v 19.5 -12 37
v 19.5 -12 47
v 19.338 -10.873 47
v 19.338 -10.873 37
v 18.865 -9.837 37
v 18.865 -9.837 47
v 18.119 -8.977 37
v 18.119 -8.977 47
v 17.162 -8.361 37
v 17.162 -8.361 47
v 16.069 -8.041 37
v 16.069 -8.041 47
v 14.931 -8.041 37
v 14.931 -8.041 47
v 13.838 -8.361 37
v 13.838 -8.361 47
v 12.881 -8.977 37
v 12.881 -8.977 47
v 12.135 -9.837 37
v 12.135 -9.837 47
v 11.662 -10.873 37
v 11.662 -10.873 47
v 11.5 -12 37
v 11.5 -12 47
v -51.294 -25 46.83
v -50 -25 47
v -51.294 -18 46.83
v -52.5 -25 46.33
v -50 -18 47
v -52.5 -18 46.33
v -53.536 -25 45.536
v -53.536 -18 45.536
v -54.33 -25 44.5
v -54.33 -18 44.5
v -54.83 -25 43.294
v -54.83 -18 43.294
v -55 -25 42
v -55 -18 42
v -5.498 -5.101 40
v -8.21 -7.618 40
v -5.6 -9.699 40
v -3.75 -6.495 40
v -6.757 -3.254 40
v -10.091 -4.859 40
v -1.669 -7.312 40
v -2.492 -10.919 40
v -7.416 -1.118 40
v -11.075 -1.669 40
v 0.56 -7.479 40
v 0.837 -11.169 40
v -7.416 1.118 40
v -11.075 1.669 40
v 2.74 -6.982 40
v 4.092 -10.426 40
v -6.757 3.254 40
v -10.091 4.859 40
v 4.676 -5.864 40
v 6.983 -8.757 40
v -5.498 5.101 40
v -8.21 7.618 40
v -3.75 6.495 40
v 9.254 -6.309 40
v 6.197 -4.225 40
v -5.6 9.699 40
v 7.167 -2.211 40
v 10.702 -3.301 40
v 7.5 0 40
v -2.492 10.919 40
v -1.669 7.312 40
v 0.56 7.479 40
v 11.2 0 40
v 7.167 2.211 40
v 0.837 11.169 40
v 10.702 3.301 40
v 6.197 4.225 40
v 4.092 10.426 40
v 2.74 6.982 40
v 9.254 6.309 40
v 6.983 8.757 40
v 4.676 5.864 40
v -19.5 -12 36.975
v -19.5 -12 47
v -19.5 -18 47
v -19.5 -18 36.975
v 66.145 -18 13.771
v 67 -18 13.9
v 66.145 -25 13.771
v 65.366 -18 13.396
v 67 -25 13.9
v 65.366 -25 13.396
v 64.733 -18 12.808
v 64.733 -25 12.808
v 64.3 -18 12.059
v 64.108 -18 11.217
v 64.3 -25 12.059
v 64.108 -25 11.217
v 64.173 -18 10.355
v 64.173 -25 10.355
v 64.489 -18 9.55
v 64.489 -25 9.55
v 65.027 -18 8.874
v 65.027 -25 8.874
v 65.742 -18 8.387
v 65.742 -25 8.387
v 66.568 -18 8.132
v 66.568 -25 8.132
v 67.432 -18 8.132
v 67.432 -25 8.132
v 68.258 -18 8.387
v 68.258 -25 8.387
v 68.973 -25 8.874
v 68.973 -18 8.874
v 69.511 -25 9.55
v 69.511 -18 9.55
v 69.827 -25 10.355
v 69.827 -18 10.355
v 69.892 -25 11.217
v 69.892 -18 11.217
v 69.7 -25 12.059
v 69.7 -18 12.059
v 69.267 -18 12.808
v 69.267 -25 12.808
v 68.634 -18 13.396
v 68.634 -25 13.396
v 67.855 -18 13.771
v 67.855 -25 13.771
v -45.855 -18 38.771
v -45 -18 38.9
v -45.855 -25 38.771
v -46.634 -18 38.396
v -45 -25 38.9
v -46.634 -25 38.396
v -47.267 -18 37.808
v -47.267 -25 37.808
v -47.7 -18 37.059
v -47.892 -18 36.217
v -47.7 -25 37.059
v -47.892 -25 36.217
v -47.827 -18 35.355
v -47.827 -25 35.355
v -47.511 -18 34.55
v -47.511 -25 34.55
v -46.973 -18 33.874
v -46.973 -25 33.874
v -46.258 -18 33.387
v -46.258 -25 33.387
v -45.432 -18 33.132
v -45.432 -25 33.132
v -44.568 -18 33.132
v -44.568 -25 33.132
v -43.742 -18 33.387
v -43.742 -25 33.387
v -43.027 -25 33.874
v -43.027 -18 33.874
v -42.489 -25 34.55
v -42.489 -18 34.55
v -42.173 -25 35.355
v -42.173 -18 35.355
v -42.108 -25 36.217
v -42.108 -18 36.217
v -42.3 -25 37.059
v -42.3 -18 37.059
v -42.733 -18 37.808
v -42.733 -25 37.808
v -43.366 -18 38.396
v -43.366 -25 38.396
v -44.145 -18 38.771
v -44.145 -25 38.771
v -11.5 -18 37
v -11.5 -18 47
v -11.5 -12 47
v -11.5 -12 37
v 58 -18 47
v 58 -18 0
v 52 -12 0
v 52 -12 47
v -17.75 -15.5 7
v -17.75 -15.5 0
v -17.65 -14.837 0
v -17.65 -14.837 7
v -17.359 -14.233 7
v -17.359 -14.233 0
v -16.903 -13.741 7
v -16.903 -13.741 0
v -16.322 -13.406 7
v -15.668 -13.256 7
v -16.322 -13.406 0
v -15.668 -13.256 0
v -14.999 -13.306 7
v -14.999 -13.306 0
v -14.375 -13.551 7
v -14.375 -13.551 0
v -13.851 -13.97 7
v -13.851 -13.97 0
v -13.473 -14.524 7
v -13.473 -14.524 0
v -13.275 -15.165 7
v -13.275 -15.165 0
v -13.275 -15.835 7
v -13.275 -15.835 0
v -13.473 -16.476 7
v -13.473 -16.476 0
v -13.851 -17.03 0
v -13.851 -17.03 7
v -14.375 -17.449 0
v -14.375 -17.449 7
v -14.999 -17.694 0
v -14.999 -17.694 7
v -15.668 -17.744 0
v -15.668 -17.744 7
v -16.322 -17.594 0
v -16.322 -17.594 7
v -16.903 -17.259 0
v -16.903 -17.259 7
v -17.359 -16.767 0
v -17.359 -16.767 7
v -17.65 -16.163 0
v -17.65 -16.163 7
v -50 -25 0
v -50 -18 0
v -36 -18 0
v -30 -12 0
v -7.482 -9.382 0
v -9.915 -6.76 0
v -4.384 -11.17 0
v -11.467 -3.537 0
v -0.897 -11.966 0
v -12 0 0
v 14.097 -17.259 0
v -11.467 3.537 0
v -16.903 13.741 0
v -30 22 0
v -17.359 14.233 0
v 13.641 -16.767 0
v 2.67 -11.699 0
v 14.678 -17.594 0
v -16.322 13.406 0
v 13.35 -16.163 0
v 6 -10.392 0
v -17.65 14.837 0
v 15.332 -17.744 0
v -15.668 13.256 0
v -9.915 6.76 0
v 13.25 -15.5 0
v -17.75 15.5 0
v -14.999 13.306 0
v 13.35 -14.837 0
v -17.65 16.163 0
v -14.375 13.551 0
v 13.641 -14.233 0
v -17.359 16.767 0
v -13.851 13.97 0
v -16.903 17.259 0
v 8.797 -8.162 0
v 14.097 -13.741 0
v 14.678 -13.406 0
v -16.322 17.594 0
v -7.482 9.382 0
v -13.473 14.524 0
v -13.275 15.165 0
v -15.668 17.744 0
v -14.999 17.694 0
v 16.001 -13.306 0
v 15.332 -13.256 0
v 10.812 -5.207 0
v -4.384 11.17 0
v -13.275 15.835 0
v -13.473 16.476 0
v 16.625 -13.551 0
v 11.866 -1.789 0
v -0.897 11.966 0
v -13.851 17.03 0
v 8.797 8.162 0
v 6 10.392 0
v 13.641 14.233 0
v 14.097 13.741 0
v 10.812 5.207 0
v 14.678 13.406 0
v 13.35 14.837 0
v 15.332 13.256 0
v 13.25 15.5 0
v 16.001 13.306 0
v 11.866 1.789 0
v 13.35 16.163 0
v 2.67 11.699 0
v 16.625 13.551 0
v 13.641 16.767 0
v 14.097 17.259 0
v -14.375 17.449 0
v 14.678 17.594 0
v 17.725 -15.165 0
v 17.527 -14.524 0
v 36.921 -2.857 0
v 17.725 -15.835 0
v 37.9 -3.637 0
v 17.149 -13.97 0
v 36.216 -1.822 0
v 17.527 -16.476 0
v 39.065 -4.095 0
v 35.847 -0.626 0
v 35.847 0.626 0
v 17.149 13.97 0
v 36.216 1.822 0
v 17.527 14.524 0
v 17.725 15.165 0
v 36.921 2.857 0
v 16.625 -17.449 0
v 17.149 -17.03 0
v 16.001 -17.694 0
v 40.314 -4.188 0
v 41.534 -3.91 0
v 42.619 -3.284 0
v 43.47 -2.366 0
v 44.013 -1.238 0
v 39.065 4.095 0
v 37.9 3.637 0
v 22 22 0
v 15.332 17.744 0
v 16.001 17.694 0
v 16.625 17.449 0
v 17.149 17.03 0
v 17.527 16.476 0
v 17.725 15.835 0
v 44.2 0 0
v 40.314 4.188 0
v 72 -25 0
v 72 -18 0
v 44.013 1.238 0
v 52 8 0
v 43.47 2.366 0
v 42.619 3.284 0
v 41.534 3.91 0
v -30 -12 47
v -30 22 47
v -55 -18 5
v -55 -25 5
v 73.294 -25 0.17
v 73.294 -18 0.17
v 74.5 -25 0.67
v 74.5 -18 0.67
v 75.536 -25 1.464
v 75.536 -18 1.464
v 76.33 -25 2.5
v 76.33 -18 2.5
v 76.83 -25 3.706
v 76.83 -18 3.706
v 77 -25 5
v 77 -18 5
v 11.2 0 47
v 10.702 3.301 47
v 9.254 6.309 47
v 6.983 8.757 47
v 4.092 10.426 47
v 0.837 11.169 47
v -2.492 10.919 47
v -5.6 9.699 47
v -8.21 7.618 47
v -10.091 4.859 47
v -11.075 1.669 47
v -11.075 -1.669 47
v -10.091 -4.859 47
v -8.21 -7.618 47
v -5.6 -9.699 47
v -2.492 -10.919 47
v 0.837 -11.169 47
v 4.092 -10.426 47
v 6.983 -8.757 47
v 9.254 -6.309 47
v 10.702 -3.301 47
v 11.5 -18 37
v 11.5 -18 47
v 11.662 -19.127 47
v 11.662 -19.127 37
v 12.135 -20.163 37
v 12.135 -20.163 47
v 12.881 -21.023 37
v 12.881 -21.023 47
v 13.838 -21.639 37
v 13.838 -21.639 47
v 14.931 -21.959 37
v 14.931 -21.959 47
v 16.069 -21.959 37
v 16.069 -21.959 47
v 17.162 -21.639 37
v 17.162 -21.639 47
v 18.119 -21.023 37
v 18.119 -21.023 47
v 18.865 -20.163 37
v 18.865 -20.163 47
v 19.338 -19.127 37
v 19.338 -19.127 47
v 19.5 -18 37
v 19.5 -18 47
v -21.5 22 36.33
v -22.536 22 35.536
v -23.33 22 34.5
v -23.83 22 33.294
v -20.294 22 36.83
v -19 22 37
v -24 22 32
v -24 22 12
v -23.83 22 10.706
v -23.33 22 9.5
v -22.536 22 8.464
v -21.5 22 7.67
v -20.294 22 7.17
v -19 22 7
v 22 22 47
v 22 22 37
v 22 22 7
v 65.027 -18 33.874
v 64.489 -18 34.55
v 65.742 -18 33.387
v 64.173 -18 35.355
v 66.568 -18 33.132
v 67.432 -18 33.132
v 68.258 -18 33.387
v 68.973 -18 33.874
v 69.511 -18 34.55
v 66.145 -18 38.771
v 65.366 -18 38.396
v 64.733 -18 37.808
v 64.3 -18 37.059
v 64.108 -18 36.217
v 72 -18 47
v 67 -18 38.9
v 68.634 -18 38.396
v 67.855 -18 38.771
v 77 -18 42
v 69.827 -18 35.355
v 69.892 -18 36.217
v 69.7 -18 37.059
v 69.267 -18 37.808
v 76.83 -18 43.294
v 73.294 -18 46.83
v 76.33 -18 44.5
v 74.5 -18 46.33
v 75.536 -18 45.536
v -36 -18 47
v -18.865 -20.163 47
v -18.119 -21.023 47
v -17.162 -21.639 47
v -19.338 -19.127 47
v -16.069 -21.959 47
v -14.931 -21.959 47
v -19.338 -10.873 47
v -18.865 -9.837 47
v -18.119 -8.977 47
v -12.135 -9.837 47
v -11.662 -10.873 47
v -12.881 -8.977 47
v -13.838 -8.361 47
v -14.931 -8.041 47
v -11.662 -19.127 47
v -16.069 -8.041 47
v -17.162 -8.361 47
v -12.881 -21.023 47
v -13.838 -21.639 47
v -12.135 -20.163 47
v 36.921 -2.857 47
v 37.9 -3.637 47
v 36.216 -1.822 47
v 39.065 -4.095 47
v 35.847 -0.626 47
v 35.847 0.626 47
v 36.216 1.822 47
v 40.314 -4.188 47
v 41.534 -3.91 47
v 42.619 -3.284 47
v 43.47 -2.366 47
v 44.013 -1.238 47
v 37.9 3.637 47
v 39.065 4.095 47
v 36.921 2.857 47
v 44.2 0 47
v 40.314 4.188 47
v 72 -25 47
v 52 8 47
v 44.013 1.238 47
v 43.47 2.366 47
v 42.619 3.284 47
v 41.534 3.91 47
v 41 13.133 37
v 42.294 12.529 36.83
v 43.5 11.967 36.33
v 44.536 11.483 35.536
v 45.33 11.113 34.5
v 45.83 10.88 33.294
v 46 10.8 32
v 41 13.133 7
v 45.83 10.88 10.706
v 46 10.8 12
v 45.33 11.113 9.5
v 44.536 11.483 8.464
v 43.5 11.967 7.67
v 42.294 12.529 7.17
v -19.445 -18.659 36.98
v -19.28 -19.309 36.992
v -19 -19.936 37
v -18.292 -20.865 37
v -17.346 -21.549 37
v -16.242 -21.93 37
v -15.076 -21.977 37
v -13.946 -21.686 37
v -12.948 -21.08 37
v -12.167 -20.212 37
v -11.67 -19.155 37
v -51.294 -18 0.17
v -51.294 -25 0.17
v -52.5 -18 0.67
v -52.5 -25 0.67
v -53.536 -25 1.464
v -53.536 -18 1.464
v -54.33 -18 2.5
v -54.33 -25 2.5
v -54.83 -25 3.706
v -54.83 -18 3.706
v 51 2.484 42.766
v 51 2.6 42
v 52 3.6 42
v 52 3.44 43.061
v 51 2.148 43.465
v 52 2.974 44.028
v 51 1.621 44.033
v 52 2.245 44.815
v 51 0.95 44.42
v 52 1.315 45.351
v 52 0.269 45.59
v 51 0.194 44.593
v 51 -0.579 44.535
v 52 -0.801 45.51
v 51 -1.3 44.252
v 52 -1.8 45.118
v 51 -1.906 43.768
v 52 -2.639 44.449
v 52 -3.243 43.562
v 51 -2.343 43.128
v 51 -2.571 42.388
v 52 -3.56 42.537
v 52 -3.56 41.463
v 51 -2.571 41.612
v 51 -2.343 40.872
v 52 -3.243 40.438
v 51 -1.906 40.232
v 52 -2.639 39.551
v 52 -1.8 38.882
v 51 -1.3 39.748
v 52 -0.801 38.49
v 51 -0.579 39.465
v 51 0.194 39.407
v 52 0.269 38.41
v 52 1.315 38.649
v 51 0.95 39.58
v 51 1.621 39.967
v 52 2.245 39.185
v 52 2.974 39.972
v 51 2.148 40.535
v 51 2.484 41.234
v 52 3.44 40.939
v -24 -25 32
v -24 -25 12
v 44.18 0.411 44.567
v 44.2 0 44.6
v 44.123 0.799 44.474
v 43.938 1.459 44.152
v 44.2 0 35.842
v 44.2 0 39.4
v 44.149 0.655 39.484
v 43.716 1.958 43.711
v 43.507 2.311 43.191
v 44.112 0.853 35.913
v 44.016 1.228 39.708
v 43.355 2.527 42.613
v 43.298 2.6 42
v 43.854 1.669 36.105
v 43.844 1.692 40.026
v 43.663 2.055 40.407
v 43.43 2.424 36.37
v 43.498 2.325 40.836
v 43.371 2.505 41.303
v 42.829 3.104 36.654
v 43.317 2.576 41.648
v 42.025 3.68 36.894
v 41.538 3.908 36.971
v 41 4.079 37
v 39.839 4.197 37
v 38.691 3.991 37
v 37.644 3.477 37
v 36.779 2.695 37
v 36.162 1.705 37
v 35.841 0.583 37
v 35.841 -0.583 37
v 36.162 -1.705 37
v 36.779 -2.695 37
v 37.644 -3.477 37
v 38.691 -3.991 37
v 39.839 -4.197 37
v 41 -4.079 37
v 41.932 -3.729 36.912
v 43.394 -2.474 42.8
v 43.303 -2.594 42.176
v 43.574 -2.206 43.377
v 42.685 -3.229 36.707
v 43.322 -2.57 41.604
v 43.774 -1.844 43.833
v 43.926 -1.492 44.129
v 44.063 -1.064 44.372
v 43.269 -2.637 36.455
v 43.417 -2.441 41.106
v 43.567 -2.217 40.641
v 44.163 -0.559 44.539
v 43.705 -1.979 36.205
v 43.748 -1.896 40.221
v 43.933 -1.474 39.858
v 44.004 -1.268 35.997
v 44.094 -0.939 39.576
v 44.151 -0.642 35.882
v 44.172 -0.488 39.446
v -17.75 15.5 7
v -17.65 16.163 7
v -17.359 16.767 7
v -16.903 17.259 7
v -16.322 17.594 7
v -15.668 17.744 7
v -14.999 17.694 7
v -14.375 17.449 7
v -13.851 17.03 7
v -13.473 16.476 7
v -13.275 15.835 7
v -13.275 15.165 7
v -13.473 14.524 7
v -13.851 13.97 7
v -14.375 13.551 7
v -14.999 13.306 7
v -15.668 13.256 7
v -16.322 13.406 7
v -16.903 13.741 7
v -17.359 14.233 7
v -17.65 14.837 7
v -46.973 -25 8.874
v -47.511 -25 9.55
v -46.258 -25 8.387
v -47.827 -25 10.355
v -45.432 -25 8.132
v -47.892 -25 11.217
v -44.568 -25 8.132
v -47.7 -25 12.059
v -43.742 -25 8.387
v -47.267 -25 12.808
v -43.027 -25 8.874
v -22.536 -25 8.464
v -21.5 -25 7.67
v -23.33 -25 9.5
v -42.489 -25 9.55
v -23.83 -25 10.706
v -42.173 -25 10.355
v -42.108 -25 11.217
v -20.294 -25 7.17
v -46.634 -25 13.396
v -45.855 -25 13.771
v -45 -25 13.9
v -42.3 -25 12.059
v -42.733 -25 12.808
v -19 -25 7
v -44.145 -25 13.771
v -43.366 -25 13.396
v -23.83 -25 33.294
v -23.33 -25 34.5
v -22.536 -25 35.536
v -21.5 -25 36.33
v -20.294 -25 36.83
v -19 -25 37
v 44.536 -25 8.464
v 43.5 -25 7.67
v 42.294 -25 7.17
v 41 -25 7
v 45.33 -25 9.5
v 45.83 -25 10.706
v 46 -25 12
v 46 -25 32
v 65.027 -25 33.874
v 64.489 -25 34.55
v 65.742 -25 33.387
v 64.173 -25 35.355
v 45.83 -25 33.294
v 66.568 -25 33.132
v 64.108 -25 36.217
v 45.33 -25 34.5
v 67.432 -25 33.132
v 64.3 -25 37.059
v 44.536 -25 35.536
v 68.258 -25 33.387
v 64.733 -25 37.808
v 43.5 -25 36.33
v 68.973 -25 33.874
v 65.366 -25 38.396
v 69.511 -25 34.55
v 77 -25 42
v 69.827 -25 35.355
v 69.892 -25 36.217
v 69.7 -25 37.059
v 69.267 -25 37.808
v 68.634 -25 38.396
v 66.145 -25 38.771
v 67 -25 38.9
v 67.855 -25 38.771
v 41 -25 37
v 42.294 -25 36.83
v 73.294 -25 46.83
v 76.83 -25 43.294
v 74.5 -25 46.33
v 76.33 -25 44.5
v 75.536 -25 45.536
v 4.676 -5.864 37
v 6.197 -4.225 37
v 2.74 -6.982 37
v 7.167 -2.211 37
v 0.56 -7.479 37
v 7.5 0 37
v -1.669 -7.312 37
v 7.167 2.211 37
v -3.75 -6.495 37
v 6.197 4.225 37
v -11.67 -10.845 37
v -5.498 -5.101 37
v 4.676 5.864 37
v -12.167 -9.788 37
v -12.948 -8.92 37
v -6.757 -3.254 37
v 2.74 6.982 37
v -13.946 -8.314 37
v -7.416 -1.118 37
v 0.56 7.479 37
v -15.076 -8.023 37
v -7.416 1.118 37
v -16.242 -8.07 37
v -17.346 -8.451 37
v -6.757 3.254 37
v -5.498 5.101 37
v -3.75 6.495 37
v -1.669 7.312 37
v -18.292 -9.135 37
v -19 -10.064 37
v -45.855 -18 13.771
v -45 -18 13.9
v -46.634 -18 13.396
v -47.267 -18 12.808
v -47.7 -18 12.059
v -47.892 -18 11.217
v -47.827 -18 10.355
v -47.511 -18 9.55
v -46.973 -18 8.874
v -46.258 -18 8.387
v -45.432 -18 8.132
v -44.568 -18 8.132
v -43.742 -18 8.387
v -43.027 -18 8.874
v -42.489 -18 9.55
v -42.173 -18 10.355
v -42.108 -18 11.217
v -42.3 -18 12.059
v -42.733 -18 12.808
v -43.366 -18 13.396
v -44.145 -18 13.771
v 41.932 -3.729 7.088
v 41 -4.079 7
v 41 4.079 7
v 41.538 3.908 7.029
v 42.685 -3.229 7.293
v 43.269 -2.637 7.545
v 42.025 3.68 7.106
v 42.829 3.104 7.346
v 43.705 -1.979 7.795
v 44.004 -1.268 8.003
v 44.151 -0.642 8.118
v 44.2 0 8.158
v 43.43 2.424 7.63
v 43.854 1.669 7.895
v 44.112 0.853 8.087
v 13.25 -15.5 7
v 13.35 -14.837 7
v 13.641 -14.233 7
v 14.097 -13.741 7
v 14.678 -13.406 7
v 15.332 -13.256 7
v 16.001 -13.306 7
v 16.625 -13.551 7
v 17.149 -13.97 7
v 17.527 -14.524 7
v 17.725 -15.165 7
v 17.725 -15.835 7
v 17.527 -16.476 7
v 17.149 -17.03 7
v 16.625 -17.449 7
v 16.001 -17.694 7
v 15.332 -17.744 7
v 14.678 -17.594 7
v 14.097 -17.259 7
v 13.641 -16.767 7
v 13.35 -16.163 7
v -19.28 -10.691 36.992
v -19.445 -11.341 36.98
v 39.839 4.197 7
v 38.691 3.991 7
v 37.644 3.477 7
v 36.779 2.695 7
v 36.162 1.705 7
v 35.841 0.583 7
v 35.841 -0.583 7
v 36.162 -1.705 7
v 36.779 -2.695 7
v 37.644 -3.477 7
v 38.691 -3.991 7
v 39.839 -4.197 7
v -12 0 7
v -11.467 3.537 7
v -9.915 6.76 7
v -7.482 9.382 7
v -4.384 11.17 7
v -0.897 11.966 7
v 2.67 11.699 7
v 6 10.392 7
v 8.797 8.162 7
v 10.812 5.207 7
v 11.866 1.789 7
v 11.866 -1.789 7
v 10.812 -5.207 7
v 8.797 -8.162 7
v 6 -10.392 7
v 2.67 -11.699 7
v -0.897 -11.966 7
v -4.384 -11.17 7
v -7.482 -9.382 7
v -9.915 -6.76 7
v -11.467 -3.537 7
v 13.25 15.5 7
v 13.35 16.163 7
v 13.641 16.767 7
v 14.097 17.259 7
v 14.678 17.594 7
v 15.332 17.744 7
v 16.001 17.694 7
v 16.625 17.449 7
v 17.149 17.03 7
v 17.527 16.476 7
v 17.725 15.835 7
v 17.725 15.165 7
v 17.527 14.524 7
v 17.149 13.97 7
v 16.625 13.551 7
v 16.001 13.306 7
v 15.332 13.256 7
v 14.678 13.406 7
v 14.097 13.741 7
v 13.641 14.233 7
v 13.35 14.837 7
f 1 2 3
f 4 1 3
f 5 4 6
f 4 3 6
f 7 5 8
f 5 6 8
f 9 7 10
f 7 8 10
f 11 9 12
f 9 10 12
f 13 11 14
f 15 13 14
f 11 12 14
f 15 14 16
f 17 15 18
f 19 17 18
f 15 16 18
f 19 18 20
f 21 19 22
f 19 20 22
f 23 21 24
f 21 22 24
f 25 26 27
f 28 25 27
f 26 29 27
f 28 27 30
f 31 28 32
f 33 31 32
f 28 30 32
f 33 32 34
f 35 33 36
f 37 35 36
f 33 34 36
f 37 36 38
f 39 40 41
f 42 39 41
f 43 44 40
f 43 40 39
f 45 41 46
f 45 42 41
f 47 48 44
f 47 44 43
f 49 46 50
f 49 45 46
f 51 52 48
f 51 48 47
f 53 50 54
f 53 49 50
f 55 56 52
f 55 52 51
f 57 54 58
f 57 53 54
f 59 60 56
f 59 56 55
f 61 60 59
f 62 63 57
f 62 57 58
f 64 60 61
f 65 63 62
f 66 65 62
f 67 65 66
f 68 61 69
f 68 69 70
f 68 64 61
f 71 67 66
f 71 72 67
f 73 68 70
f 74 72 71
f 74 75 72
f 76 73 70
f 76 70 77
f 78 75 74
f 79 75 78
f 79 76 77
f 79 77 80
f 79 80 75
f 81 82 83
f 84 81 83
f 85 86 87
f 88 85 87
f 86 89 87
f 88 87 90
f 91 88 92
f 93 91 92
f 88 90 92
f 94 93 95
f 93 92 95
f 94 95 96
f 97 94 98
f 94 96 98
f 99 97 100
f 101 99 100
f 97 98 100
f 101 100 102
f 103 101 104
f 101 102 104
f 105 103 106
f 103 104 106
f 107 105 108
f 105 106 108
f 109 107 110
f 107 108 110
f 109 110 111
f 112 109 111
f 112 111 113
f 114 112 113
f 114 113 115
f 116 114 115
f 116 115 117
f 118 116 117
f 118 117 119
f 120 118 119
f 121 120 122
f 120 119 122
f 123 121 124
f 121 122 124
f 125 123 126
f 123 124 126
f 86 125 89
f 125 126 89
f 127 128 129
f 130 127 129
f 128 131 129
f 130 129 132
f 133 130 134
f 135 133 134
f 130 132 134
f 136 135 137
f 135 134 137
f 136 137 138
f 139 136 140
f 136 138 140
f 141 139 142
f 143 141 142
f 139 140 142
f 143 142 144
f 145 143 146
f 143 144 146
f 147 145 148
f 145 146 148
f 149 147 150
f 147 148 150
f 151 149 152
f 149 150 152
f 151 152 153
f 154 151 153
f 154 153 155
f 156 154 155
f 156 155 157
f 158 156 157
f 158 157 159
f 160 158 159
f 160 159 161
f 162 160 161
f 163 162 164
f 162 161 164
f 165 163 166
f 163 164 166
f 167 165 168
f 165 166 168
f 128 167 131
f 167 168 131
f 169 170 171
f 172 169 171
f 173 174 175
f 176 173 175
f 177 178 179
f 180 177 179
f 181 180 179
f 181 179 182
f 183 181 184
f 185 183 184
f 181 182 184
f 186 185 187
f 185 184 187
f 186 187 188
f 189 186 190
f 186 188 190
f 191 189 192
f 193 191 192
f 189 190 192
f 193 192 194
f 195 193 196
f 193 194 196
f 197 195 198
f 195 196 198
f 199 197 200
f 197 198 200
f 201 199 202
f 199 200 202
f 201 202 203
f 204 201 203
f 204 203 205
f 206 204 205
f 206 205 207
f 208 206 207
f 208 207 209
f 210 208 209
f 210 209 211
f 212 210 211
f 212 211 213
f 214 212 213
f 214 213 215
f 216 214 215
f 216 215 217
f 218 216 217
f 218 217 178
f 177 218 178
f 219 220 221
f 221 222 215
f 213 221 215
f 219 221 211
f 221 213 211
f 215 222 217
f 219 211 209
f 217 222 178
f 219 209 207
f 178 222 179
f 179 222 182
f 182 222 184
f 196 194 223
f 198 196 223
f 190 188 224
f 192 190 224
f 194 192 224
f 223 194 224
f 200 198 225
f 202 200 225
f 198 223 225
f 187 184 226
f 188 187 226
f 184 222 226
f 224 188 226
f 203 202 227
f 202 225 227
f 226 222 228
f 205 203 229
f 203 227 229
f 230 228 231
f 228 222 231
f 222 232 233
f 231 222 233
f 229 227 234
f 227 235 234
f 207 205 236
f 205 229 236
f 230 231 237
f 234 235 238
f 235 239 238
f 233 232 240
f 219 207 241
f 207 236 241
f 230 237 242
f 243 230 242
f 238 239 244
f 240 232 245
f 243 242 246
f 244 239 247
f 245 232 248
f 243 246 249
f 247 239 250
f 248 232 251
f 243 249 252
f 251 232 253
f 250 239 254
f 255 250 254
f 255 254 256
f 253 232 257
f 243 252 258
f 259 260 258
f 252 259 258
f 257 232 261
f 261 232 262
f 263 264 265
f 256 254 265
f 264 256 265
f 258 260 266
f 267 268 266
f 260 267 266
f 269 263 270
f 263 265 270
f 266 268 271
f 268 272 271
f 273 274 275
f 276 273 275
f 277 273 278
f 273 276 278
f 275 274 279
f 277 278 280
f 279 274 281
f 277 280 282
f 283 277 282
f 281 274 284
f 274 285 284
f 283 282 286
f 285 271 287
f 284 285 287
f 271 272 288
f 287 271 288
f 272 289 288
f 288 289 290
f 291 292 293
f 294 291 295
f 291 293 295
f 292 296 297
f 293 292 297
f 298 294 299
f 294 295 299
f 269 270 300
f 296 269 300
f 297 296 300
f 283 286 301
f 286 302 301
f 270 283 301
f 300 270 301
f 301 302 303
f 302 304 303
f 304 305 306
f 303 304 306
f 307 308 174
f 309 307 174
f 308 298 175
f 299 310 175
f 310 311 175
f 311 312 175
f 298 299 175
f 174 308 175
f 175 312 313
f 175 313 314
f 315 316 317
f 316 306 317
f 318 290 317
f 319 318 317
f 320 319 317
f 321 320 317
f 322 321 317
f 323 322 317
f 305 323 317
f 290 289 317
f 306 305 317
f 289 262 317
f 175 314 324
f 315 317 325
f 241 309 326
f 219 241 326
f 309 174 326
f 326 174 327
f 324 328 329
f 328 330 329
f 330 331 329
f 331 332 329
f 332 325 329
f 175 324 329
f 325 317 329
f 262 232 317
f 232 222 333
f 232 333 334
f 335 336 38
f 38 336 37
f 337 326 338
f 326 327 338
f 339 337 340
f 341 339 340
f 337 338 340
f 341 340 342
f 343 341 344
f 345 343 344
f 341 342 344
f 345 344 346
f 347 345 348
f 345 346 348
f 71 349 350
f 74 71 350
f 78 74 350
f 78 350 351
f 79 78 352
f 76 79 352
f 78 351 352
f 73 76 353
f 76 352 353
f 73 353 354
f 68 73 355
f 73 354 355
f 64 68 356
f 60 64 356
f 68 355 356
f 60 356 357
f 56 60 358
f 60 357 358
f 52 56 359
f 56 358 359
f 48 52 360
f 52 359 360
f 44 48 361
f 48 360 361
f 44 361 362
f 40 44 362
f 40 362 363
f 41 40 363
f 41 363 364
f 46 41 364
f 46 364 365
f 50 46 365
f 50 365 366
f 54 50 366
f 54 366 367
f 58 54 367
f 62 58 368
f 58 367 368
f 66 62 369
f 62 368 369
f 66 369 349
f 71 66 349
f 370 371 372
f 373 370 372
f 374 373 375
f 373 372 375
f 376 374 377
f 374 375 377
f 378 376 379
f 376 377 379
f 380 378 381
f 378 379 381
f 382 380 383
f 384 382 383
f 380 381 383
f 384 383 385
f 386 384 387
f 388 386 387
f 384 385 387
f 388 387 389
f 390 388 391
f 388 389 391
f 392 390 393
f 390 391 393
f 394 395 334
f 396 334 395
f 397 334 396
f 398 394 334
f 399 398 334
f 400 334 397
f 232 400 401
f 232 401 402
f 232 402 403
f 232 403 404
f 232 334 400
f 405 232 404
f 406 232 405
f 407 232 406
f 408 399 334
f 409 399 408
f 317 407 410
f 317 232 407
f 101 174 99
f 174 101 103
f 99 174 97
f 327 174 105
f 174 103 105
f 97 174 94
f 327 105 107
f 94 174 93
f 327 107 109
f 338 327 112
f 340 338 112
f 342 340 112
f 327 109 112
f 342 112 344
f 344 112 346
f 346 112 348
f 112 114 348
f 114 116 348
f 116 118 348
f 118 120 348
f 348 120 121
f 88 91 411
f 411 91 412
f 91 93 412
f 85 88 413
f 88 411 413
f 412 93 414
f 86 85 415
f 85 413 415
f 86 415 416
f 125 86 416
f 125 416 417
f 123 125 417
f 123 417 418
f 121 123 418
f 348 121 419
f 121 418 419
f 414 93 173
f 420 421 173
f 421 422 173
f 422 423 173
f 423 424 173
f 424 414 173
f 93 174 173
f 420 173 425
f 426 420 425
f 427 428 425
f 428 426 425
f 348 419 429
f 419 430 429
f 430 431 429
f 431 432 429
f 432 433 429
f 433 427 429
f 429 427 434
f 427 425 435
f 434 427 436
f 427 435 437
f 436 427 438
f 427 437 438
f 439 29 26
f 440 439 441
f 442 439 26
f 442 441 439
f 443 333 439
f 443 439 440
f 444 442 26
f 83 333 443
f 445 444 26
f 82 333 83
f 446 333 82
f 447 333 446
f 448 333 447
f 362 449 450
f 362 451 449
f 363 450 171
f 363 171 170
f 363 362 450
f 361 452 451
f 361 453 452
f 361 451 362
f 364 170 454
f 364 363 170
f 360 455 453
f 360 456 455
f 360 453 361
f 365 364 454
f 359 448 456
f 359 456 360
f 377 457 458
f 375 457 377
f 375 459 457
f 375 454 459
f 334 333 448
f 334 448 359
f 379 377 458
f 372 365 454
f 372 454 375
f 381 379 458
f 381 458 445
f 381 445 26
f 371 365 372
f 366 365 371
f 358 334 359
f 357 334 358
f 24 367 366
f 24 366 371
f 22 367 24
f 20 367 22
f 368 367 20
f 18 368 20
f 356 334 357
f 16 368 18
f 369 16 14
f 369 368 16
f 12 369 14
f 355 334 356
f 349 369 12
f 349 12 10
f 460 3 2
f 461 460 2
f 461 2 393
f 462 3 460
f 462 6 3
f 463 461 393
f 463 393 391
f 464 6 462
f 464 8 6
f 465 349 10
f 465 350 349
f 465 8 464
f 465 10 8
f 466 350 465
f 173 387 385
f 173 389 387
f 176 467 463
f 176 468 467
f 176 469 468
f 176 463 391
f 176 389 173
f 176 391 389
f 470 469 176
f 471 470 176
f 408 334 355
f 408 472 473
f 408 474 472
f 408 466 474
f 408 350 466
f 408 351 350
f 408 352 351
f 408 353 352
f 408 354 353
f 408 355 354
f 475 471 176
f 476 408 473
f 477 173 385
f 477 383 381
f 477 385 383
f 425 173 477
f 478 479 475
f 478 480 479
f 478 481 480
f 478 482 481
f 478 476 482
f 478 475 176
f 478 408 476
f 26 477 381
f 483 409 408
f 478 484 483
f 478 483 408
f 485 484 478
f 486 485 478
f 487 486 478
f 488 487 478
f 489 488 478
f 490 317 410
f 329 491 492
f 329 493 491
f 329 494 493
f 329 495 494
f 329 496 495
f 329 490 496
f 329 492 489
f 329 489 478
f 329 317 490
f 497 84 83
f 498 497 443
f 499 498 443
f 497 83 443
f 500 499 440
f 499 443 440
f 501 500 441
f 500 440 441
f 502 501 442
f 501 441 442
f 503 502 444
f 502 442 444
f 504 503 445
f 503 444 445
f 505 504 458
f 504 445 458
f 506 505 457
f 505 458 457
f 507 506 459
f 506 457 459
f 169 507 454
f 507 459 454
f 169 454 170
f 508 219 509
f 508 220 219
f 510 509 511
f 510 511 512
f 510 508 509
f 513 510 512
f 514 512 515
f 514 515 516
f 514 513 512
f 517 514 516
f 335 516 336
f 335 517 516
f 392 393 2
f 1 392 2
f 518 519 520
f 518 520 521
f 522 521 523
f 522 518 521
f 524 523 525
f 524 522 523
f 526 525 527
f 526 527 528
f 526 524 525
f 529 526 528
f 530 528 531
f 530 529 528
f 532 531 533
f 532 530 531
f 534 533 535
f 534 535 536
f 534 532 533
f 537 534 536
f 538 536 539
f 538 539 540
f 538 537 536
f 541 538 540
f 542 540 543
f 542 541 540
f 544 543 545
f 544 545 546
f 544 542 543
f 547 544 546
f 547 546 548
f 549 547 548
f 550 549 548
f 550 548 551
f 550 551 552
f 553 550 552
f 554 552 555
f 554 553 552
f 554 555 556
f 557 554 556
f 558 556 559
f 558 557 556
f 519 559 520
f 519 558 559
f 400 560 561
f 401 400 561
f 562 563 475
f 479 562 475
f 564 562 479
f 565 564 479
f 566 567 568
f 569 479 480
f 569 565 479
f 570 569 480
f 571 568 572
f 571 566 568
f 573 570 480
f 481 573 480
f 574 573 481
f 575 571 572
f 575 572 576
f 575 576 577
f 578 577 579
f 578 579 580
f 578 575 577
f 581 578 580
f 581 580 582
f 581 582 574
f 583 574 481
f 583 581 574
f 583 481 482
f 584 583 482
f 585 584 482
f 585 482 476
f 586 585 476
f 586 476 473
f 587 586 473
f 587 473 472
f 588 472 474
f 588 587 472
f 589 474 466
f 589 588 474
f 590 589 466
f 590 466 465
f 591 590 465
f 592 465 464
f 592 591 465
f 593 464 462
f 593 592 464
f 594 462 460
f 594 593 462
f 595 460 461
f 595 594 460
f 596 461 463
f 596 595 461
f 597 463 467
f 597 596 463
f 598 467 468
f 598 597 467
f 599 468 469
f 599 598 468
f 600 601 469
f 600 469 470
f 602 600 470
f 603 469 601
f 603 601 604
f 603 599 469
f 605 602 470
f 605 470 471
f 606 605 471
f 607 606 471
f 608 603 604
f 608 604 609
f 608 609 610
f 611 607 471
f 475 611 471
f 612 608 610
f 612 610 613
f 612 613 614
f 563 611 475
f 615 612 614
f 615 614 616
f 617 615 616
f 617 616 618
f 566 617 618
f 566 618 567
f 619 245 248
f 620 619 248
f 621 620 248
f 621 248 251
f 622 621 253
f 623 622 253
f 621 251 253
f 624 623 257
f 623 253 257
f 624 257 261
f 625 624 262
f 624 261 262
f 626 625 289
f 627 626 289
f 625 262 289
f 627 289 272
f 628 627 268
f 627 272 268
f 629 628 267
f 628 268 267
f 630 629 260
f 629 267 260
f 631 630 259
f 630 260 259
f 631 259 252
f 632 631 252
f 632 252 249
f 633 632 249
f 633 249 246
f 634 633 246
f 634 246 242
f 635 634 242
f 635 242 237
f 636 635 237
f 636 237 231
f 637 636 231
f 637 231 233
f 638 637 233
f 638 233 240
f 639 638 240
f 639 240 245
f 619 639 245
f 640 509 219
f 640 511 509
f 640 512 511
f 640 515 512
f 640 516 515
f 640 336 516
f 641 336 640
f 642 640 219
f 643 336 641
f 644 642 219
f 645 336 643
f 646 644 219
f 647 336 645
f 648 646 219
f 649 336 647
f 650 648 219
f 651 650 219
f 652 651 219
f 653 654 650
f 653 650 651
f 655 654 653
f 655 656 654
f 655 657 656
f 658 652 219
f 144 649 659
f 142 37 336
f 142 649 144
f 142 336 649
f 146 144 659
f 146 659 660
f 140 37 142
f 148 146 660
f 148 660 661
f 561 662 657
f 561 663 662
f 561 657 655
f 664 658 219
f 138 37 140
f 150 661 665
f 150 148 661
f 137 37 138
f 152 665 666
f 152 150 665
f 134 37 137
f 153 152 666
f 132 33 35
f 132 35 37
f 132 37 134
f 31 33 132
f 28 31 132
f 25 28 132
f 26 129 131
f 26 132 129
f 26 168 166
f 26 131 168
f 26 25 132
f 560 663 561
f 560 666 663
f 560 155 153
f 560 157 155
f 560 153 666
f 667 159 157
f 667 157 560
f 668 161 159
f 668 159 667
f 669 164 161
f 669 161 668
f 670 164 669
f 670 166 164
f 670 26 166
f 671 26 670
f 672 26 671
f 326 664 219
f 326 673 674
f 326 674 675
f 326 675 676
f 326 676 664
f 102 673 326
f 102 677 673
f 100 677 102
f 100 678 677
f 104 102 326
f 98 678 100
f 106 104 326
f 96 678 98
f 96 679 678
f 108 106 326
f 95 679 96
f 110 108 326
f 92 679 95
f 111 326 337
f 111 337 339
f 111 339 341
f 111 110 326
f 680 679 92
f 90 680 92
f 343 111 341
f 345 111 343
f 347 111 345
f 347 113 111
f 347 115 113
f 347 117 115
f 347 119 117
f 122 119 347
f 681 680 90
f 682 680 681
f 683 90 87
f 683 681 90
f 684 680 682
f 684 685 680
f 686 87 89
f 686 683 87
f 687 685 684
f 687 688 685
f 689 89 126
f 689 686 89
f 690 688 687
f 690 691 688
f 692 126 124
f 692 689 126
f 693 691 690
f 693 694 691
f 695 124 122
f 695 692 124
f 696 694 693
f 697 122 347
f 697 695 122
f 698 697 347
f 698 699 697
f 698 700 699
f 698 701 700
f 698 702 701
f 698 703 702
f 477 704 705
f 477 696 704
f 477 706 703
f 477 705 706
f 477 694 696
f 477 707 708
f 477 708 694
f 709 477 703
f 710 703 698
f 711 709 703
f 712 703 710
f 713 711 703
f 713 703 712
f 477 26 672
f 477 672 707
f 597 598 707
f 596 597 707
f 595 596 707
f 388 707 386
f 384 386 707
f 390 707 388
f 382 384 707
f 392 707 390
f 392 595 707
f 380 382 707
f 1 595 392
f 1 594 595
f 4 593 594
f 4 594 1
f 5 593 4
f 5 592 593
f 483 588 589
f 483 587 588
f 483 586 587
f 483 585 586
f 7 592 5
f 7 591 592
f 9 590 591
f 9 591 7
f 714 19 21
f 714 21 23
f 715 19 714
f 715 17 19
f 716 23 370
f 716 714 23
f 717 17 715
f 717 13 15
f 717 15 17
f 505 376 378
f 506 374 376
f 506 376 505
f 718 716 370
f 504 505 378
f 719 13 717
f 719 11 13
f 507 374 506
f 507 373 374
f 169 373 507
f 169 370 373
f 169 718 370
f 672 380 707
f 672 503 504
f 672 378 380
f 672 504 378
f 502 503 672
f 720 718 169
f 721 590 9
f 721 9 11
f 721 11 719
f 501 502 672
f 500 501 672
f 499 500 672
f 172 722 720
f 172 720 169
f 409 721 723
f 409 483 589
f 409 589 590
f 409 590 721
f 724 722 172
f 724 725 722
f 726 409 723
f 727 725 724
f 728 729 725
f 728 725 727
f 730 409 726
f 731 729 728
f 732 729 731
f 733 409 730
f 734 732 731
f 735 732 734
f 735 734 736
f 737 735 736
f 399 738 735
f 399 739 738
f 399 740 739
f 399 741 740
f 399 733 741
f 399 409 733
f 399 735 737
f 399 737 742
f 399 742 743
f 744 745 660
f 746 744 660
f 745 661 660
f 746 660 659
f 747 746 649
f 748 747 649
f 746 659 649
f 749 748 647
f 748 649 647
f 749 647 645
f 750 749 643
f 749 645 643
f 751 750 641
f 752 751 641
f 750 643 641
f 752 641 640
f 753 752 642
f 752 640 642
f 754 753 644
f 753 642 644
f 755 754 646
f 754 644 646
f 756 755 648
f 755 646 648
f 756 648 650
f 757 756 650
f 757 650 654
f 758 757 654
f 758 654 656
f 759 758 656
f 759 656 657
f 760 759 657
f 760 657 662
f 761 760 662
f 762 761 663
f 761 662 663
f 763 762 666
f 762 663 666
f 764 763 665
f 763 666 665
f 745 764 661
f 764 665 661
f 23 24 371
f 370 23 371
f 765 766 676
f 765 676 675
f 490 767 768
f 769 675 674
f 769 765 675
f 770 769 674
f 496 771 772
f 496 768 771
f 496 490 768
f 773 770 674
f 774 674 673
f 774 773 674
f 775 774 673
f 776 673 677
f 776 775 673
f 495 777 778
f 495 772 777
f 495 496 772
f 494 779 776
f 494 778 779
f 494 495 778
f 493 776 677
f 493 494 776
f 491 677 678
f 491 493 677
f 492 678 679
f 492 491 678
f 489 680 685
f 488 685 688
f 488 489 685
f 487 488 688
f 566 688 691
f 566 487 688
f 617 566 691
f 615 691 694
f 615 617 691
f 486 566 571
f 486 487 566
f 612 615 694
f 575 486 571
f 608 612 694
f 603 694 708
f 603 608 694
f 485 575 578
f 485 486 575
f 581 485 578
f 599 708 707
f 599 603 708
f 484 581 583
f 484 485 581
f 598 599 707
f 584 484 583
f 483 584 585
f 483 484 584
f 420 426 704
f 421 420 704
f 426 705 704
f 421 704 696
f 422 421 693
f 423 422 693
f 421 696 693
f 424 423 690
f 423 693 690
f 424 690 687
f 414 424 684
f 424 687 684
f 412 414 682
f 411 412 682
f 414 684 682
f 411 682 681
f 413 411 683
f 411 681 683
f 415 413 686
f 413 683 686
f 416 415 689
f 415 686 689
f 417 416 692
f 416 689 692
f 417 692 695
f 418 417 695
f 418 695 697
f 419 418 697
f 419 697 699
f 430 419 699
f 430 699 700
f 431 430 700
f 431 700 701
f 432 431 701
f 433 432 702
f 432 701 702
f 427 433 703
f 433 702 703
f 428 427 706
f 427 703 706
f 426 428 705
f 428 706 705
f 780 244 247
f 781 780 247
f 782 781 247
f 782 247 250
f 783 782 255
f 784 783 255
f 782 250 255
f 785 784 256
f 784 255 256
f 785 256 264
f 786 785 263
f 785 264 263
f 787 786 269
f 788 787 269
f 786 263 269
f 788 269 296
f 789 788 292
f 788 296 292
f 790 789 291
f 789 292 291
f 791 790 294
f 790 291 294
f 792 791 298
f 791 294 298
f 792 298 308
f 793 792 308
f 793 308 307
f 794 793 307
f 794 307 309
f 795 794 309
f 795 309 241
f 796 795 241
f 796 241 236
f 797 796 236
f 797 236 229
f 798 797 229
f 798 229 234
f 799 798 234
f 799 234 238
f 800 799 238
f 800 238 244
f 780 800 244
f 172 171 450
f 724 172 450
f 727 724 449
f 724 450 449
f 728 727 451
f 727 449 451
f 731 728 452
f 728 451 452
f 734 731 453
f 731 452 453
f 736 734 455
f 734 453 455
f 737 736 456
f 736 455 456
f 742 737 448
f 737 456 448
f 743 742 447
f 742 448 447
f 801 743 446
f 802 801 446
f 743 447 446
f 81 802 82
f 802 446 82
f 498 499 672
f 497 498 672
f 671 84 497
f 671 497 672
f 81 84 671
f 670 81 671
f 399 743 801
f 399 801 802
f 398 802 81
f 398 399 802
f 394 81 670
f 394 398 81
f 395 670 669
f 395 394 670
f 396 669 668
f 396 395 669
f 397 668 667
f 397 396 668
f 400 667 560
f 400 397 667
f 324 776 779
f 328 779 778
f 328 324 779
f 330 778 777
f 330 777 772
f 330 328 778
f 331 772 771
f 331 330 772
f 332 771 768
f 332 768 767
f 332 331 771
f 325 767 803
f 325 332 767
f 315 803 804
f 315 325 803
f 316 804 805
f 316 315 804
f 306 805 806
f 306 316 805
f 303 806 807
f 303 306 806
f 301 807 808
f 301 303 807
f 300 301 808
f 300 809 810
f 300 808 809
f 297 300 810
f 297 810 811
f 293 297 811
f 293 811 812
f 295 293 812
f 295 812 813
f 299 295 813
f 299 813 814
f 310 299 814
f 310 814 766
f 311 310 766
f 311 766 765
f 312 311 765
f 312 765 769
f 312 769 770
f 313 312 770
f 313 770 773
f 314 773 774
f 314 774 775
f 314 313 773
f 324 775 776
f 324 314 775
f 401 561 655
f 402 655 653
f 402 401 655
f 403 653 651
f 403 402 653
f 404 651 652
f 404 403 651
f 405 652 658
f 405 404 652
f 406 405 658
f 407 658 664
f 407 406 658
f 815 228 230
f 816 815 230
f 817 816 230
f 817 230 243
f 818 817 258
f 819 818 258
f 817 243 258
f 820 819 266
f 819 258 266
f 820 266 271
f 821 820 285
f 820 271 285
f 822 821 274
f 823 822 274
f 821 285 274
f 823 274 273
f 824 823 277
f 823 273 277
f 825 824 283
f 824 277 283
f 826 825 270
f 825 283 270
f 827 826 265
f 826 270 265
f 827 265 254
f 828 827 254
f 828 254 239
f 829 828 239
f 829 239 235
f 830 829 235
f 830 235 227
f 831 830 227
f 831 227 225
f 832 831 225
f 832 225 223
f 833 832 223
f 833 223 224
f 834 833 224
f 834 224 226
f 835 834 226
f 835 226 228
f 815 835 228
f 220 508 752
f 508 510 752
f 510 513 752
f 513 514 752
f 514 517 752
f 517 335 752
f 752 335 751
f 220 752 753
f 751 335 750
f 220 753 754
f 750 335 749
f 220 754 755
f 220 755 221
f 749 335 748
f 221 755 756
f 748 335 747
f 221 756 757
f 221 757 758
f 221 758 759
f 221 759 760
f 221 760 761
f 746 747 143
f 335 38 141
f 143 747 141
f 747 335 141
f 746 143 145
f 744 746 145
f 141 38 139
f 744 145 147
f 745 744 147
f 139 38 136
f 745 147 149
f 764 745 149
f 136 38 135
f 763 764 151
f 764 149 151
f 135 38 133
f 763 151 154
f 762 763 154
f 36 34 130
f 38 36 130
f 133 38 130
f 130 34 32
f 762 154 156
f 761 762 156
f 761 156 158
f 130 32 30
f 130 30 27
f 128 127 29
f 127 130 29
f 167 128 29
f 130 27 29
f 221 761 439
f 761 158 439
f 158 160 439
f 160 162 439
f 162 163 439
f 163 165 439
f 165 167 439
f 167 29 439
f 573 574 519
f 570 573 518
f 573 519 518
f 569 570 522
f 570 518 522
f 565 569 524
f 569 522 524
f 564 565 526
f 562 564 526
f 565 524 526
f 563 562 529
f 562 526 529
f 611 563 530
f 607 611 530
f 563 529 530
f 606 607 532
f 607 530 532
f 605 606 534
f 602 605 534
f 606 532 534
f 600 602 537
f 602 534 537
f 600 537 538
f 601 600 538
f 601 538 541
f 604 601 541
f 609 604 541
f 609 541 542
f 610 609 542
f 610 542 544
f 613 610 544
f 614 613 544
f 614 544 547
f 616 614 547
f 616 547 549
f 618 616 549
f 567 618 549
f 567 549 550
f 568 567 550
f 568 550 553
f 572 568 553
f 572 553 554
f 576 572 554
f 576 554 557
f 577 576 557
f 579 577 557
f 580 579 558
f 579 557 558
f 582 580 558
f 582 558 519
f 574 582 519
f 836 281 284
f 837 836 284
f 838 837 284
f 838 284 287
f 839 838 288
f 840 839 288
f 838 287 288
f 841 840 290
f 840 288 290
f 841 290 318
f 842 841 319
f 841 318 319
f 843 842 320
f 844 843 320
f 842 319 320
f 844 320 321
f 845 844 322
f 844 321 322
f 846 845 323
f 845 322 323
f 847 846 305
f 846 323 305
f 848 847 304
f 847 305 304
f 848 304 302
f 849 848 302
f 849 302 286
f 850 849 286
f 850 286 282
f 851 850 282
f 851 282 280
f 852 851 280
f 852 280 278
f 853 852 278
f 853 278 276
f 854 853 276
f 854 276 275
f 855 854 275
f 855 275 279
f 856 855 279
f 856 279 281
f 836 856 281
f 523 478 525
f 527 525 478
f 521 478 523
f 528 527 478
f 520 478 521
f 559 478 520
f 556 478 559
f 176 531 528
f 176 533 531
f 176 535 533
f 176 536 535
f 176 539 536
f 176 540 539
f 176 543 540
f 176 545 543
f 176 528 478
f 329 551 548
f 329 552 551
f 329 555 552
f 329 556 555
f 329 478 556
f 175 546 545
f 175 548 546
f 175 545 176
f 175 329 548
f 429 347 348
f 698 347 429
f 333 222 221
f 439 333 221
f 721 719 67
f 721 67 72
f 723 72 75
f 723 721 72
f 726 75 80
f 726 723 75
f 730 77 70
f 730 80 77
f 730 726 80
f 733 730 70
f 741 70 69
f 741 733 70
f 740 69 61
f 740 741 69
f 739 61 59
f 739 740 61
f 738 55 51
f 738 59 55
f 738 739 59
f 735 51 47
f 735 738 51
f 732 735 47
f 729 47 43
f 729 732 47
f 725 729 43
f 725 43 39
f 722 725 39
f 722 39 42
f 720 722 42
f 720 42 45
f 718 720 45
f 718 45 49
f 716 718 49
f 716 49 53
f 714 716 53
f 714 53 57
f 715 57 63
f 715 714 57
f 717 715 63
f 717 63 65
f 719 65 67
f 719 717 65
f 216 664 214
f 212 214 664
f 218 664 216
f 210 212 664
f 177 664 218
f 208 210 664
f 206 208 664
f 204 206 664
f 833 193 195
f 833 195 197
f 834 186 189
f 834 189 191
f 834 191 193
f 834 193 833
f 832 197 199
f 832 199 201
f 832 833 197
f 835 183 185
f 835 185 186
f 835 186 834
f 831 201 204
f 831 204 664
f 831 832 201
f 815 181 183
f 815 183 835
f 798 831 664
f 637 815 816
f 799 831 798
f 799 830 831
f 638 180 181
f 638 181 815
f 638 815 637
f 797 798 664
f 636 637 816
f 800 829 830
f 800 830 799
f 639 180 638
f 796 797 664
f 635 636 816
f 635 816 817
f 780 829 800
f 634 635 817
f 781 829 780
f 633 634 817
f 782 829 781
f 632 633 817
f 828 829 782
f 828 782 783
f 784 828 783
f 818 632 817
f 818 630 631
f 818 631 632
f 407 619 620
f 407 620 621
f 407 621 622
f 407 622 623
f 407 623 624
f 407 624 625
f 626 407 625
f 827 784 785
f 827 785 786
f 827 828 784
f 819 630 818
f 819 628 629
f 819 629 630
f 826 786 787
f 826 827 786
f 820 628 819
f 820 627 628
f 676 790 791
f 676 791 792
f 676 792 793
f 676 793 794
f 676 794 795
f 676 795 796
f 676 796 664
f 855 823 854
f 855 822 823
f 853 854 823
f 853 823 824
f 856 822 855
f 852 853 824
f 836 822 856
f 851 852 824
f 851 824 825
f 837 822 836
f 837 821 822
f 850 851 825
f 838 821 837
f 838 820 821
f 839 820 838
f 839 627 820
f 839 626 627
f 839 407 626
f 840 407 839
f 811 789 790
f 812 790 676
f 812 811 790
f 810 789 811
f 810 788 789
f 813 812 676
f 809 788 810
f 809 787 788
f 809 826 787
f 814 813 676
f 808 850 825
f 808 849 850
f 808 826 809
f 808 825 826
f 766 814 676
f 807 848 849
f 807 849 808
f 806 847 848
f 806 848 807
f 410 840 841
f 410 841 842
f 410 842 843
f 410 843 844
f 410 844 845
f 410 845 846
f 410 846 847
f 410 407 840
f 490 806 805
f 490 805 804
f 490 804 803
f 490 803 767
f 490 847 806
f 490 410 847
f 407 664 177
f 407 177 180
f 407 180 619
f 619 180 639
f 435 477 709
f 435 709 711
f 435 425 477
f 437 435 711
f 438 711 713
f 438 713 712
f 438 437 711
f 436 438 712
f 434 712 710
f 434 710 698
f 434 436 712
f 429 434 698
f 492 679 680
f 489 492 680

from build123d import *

# Parameters (mm, degrees)
SKETCH1_R                     = 7.5
SKETCH1_R_2                   = 4.2
BOSS_EXTRUDE1_DEPTH           = 47
SKETCH2_R                     = 11.2
CUT_EXTRUDE1_DEPTH            = 7
SKETCH3_R                     = 2.25
SKETCH3_R_2                   = 12
CUT_EXTRUDE2_DEPTH            = 15
CUT_EXTRUDE3_DEPTH            = 85.391942743
CUT_EXTRUDE4_DEPTH            = 20
SKETCH7_R                     = 2.6
CUT_EXTRUDE5_DEPTH            = 10
CHAMFER2_SIZE                 = 1
SKETCH9_W                     = 25
SKETCH9_H                     = 47
BOSS_EXTRUDE2_DEPTH           = 7
BOSS_EXTRUDE2_2_DEPTH         = 7
SKETCH10_W                    = 2.9
SKETCH10_H                    = 7
M5_CLEARANCE_HOLE1_AT_2_COUNT = 2
M5_CLEARANCE_HOLE1_AT_2_PITCH = 25
M5_CLEARANCE_HOLE1_AT_3_COUNT = 2
M5_CLEARANCE_HOLE1_AT_3_PITCH = 114.756263446
M5_CLEARANCE_HOLE1_AT_4_COUNT = 2
M5_CLEARANCE_HOLE1_AT_4_PITCH = 112
BOSS_EXTRUDE3_DEPTH           = 47
FILLET1_R                     = 5


with BuildPart() as part:
    # Sketch1 → Boss-Extrude1 (new body)
    with BuildSketch(Plane.XY):
        Polygon((-30, -25), (-30, 22), (22, 22), (52, 8), (52, -25), align=None)
        Circle(SKETCH1_R, mode=Mode.SUBTRACT)
        with Locations((40, 0)):
            Circle(SKETCH1_R_2, mode=Mode.SUBTRACT)
    extrude(amount=BOSS_EXTRUDE1_DEPTH)

    # Sketch2 → Cut-Extrude1 (cut)
    with BuildSketch(Plane.XY.offset(47)):
        Circle(SKETCH2_R)
    extrude(amount=-CUT_EXTRUDE1_DEPTH, mode=Mode.SUBTRACT)

    # Sketch3 → Cut-Extrude2 (cut)
    with BuildSketch(Plane(origin=(0, 0, 0), x_dir=(-1, 0, 0), z_dir=(0, 0, -1))):
        with Locations((-15.5, 15.5)):
            Circle(SKETCH3_R)
        with Locations((-15.5, -15.5)):
            Circle(SKETCH3_R)
        with Locations((15.5, -15.5)):
            Circle(SKETCH3_R)
        with Locations((15.5, 15.5)):
            Circle(SKETCH3_R)
        Circle(SKETCH3_R_2)
    extrude(amount=-CUT_EXTRUDE2_DEPTH, mode=Mode.SUBTRACT)

    # Sketch4 → Cut-Extrude3 (cut, through all)
    with BuildSketch(Plane(origin=(0, 22, 0), x_dir=(1, 0, 0), z_dir=(0, 1, 0))):
        with BuildLine():
            Line((-19, -7), (41, -7))
            ThreePointArc((41, -7), (44.535533906, -8.464466094), (46, -12))
            Line((46, -12), (46, -32))
            ThreePointArc((46, -32), (44.535533906, -35.535533906), (41, -37))
            Line((41, -37), (-19, -37))
            ThreePointArc((-19, -37), (-22.535533906, -35.535533906), (-24, -32))
            Line((-24, -32), (-24, -12))
            ThreePointArc((-24, -12), (-22.535533906, -8.464466094), (-19, -7))
        make_face()
    extrude(amount=-CUT_EXTRUDE3_DEPTH, mode=Mode.SUBTRACT)

    # Sketch6 → Cut-Extrude4 (cut)
    with BuildSketch(Plane.XY.offset(47)):
        with BuildLine():
            Line((-19.5, -12), (-19.5, -18))
            ThreePointArc((-19.5, -18), (-15.5, -22), (-11.5, -18))
            Line((-11.5, -18), (-11.5, -12))
            ThreePointArc((-11.5, -12), (-15.5, -8), (-19.5, -12))
        make_face()
        with BuildLine():
            Line((11.5, -12), (11.5, -18))
            ThreePointArc((11.5, -18), (15.5, -22), (19.5, -18))
            Line((19.5, -18), (19.5, -12))
            ThreePointArc((19.5, -12), (15.5, -8), (11.5, -12))
        make_face()
    extrude(amount=-CUT_EXTRUDE4_DEPTH, mode=Mode.SUBTRACT)

    # Sketch7 → Cut-Extrude5 (cut)
    with BuildSketch(Plane(origin=(52, 0, 0), x_dir=(0, 0, -1), z_dir=(1, 0, 0))):
        with Locations(Location((-42, 0, 0), (0, 0, 90))):
            Circle(SKETCH7_R)
    extrude(amount=-CUT_EXTRUDE5_DEPTH, mode=Mode.SUBTRACT)

    # Chamfer2
    chamfer2_edges = [part.edges().sort_by_distance(p)[0] for p in [
        (52, -2.6, 42),
    ]]
    chamfer(chamfer2_edges, length=CHAMFER2_SIZE)



with BuildPart() as body_2:
    # Sketch9 → Boss-Extrude2 (new body)
    with BuildSketch(Plane.XZ.offset(25)):
        with Locations((-42.5, 23.5)):
            Rectangle(SKETCH9_W, SKETCH9_H)
    extrude(amount=-BOSS_EXTRUDE2_DEPTH)

    # Sketch10 → M5 Clearance Hole1 (revolve, cut)
    with BuildSketch(Plane(origin=(-45, -18, 36), x_dir=(0, 0, 1), z_dir=(1, 0, 0))):
        with Locations((1.45, 3.5)):
            Rectangle(SKETCH10_W, SKETCH10_H)
    m5_clearance_hole1 = revolve(axis=Axis((-45, -11.65, 36), (0, -1, 0)), mode=Mode.SUBTRACT)

    # M5 Clearance Hole1 at 2: M5 Clearance Hole1 ×2
    with Locations(*[(0, 0, -i * M5_CLEARANCE_HOLE1_AT_2_PITCH) for i in range(1, M5_CLEARANCE_HOLE1_AT_2_COUNT)]):
        add(m5_clearance_hole1, mode=Mode.SUBTRACT)


with BuildPart() as body_3:
    # Sketch9 → Boss-Extrude2 2 (new body)
    with BuildSketch(Plane.XZ.offset(25)):
        with Locations((64.5, 23.5)):
            Rectangle(SKETCH9_W, SKETCH9_H)
    extrude(amount=-BOSS_EXTRUDE2_2_DEPTH)

    # M5 Clearance Hole1 at 3: M5 Clearance Hole1 ×2
    with Locations(*[Vector(0.9759815859905214, 0, -0.21785303258717012) * (i * M5_CLEARANCE_HOLE1_AT_3_PITCH) for i in range(1, M5_CLEARANCE_HOLE1_AT_3_COUNT)]):
        add(m5_clearance_hole1, mode=Mode.SUBTRACT)

    # M5 Clearance Hole1 at 4: M5 Clearance Hole1 ×2
    with Locations(*[(i * M5_CLEARANCE_HOLE1_AT_4_PITCH, 0, 0) for i in range(1, M5_CLEARANCE_HOLE1_AT_4_COUNT)]):
        add(m5_clearance_hole1, mode=Mode.SUBTRACT)


with BuildPart() as part_1:
    add(part.part)

    add(body_2.part)  # Boss-Extrude3 merges body 2

    add(body_3.part)  # Boss-Extrude3 merges body 3
    # Sketch13 → Boss-Extrude3 (add)
    with BuildSketch(Plane(origin=(0, 0, 0), x_dir=(-1, 0, 0), z_dir=(0, 0, -1))):
        Polygon((-52, -18), (-58, -18), (-52, -12), align=None)
        Polygon((30, -18), (30, -12), (36, -18), align=None)
    extrude(amount=-BOSS_EXTRUDE3_DEPTH)

    # Fillet1
    fillet1_edges = [part_1.edges().sort_by_distance(p)[0] for p in [
        (-55, -21.5, 47),
        (-55, -21.5, 0),
        (77, -21.5, 0),
        (77, -21.5, 47),
    ]]
    fillet(fillet1_edges, radius=FILLET1_R)


solid = part_1.part
